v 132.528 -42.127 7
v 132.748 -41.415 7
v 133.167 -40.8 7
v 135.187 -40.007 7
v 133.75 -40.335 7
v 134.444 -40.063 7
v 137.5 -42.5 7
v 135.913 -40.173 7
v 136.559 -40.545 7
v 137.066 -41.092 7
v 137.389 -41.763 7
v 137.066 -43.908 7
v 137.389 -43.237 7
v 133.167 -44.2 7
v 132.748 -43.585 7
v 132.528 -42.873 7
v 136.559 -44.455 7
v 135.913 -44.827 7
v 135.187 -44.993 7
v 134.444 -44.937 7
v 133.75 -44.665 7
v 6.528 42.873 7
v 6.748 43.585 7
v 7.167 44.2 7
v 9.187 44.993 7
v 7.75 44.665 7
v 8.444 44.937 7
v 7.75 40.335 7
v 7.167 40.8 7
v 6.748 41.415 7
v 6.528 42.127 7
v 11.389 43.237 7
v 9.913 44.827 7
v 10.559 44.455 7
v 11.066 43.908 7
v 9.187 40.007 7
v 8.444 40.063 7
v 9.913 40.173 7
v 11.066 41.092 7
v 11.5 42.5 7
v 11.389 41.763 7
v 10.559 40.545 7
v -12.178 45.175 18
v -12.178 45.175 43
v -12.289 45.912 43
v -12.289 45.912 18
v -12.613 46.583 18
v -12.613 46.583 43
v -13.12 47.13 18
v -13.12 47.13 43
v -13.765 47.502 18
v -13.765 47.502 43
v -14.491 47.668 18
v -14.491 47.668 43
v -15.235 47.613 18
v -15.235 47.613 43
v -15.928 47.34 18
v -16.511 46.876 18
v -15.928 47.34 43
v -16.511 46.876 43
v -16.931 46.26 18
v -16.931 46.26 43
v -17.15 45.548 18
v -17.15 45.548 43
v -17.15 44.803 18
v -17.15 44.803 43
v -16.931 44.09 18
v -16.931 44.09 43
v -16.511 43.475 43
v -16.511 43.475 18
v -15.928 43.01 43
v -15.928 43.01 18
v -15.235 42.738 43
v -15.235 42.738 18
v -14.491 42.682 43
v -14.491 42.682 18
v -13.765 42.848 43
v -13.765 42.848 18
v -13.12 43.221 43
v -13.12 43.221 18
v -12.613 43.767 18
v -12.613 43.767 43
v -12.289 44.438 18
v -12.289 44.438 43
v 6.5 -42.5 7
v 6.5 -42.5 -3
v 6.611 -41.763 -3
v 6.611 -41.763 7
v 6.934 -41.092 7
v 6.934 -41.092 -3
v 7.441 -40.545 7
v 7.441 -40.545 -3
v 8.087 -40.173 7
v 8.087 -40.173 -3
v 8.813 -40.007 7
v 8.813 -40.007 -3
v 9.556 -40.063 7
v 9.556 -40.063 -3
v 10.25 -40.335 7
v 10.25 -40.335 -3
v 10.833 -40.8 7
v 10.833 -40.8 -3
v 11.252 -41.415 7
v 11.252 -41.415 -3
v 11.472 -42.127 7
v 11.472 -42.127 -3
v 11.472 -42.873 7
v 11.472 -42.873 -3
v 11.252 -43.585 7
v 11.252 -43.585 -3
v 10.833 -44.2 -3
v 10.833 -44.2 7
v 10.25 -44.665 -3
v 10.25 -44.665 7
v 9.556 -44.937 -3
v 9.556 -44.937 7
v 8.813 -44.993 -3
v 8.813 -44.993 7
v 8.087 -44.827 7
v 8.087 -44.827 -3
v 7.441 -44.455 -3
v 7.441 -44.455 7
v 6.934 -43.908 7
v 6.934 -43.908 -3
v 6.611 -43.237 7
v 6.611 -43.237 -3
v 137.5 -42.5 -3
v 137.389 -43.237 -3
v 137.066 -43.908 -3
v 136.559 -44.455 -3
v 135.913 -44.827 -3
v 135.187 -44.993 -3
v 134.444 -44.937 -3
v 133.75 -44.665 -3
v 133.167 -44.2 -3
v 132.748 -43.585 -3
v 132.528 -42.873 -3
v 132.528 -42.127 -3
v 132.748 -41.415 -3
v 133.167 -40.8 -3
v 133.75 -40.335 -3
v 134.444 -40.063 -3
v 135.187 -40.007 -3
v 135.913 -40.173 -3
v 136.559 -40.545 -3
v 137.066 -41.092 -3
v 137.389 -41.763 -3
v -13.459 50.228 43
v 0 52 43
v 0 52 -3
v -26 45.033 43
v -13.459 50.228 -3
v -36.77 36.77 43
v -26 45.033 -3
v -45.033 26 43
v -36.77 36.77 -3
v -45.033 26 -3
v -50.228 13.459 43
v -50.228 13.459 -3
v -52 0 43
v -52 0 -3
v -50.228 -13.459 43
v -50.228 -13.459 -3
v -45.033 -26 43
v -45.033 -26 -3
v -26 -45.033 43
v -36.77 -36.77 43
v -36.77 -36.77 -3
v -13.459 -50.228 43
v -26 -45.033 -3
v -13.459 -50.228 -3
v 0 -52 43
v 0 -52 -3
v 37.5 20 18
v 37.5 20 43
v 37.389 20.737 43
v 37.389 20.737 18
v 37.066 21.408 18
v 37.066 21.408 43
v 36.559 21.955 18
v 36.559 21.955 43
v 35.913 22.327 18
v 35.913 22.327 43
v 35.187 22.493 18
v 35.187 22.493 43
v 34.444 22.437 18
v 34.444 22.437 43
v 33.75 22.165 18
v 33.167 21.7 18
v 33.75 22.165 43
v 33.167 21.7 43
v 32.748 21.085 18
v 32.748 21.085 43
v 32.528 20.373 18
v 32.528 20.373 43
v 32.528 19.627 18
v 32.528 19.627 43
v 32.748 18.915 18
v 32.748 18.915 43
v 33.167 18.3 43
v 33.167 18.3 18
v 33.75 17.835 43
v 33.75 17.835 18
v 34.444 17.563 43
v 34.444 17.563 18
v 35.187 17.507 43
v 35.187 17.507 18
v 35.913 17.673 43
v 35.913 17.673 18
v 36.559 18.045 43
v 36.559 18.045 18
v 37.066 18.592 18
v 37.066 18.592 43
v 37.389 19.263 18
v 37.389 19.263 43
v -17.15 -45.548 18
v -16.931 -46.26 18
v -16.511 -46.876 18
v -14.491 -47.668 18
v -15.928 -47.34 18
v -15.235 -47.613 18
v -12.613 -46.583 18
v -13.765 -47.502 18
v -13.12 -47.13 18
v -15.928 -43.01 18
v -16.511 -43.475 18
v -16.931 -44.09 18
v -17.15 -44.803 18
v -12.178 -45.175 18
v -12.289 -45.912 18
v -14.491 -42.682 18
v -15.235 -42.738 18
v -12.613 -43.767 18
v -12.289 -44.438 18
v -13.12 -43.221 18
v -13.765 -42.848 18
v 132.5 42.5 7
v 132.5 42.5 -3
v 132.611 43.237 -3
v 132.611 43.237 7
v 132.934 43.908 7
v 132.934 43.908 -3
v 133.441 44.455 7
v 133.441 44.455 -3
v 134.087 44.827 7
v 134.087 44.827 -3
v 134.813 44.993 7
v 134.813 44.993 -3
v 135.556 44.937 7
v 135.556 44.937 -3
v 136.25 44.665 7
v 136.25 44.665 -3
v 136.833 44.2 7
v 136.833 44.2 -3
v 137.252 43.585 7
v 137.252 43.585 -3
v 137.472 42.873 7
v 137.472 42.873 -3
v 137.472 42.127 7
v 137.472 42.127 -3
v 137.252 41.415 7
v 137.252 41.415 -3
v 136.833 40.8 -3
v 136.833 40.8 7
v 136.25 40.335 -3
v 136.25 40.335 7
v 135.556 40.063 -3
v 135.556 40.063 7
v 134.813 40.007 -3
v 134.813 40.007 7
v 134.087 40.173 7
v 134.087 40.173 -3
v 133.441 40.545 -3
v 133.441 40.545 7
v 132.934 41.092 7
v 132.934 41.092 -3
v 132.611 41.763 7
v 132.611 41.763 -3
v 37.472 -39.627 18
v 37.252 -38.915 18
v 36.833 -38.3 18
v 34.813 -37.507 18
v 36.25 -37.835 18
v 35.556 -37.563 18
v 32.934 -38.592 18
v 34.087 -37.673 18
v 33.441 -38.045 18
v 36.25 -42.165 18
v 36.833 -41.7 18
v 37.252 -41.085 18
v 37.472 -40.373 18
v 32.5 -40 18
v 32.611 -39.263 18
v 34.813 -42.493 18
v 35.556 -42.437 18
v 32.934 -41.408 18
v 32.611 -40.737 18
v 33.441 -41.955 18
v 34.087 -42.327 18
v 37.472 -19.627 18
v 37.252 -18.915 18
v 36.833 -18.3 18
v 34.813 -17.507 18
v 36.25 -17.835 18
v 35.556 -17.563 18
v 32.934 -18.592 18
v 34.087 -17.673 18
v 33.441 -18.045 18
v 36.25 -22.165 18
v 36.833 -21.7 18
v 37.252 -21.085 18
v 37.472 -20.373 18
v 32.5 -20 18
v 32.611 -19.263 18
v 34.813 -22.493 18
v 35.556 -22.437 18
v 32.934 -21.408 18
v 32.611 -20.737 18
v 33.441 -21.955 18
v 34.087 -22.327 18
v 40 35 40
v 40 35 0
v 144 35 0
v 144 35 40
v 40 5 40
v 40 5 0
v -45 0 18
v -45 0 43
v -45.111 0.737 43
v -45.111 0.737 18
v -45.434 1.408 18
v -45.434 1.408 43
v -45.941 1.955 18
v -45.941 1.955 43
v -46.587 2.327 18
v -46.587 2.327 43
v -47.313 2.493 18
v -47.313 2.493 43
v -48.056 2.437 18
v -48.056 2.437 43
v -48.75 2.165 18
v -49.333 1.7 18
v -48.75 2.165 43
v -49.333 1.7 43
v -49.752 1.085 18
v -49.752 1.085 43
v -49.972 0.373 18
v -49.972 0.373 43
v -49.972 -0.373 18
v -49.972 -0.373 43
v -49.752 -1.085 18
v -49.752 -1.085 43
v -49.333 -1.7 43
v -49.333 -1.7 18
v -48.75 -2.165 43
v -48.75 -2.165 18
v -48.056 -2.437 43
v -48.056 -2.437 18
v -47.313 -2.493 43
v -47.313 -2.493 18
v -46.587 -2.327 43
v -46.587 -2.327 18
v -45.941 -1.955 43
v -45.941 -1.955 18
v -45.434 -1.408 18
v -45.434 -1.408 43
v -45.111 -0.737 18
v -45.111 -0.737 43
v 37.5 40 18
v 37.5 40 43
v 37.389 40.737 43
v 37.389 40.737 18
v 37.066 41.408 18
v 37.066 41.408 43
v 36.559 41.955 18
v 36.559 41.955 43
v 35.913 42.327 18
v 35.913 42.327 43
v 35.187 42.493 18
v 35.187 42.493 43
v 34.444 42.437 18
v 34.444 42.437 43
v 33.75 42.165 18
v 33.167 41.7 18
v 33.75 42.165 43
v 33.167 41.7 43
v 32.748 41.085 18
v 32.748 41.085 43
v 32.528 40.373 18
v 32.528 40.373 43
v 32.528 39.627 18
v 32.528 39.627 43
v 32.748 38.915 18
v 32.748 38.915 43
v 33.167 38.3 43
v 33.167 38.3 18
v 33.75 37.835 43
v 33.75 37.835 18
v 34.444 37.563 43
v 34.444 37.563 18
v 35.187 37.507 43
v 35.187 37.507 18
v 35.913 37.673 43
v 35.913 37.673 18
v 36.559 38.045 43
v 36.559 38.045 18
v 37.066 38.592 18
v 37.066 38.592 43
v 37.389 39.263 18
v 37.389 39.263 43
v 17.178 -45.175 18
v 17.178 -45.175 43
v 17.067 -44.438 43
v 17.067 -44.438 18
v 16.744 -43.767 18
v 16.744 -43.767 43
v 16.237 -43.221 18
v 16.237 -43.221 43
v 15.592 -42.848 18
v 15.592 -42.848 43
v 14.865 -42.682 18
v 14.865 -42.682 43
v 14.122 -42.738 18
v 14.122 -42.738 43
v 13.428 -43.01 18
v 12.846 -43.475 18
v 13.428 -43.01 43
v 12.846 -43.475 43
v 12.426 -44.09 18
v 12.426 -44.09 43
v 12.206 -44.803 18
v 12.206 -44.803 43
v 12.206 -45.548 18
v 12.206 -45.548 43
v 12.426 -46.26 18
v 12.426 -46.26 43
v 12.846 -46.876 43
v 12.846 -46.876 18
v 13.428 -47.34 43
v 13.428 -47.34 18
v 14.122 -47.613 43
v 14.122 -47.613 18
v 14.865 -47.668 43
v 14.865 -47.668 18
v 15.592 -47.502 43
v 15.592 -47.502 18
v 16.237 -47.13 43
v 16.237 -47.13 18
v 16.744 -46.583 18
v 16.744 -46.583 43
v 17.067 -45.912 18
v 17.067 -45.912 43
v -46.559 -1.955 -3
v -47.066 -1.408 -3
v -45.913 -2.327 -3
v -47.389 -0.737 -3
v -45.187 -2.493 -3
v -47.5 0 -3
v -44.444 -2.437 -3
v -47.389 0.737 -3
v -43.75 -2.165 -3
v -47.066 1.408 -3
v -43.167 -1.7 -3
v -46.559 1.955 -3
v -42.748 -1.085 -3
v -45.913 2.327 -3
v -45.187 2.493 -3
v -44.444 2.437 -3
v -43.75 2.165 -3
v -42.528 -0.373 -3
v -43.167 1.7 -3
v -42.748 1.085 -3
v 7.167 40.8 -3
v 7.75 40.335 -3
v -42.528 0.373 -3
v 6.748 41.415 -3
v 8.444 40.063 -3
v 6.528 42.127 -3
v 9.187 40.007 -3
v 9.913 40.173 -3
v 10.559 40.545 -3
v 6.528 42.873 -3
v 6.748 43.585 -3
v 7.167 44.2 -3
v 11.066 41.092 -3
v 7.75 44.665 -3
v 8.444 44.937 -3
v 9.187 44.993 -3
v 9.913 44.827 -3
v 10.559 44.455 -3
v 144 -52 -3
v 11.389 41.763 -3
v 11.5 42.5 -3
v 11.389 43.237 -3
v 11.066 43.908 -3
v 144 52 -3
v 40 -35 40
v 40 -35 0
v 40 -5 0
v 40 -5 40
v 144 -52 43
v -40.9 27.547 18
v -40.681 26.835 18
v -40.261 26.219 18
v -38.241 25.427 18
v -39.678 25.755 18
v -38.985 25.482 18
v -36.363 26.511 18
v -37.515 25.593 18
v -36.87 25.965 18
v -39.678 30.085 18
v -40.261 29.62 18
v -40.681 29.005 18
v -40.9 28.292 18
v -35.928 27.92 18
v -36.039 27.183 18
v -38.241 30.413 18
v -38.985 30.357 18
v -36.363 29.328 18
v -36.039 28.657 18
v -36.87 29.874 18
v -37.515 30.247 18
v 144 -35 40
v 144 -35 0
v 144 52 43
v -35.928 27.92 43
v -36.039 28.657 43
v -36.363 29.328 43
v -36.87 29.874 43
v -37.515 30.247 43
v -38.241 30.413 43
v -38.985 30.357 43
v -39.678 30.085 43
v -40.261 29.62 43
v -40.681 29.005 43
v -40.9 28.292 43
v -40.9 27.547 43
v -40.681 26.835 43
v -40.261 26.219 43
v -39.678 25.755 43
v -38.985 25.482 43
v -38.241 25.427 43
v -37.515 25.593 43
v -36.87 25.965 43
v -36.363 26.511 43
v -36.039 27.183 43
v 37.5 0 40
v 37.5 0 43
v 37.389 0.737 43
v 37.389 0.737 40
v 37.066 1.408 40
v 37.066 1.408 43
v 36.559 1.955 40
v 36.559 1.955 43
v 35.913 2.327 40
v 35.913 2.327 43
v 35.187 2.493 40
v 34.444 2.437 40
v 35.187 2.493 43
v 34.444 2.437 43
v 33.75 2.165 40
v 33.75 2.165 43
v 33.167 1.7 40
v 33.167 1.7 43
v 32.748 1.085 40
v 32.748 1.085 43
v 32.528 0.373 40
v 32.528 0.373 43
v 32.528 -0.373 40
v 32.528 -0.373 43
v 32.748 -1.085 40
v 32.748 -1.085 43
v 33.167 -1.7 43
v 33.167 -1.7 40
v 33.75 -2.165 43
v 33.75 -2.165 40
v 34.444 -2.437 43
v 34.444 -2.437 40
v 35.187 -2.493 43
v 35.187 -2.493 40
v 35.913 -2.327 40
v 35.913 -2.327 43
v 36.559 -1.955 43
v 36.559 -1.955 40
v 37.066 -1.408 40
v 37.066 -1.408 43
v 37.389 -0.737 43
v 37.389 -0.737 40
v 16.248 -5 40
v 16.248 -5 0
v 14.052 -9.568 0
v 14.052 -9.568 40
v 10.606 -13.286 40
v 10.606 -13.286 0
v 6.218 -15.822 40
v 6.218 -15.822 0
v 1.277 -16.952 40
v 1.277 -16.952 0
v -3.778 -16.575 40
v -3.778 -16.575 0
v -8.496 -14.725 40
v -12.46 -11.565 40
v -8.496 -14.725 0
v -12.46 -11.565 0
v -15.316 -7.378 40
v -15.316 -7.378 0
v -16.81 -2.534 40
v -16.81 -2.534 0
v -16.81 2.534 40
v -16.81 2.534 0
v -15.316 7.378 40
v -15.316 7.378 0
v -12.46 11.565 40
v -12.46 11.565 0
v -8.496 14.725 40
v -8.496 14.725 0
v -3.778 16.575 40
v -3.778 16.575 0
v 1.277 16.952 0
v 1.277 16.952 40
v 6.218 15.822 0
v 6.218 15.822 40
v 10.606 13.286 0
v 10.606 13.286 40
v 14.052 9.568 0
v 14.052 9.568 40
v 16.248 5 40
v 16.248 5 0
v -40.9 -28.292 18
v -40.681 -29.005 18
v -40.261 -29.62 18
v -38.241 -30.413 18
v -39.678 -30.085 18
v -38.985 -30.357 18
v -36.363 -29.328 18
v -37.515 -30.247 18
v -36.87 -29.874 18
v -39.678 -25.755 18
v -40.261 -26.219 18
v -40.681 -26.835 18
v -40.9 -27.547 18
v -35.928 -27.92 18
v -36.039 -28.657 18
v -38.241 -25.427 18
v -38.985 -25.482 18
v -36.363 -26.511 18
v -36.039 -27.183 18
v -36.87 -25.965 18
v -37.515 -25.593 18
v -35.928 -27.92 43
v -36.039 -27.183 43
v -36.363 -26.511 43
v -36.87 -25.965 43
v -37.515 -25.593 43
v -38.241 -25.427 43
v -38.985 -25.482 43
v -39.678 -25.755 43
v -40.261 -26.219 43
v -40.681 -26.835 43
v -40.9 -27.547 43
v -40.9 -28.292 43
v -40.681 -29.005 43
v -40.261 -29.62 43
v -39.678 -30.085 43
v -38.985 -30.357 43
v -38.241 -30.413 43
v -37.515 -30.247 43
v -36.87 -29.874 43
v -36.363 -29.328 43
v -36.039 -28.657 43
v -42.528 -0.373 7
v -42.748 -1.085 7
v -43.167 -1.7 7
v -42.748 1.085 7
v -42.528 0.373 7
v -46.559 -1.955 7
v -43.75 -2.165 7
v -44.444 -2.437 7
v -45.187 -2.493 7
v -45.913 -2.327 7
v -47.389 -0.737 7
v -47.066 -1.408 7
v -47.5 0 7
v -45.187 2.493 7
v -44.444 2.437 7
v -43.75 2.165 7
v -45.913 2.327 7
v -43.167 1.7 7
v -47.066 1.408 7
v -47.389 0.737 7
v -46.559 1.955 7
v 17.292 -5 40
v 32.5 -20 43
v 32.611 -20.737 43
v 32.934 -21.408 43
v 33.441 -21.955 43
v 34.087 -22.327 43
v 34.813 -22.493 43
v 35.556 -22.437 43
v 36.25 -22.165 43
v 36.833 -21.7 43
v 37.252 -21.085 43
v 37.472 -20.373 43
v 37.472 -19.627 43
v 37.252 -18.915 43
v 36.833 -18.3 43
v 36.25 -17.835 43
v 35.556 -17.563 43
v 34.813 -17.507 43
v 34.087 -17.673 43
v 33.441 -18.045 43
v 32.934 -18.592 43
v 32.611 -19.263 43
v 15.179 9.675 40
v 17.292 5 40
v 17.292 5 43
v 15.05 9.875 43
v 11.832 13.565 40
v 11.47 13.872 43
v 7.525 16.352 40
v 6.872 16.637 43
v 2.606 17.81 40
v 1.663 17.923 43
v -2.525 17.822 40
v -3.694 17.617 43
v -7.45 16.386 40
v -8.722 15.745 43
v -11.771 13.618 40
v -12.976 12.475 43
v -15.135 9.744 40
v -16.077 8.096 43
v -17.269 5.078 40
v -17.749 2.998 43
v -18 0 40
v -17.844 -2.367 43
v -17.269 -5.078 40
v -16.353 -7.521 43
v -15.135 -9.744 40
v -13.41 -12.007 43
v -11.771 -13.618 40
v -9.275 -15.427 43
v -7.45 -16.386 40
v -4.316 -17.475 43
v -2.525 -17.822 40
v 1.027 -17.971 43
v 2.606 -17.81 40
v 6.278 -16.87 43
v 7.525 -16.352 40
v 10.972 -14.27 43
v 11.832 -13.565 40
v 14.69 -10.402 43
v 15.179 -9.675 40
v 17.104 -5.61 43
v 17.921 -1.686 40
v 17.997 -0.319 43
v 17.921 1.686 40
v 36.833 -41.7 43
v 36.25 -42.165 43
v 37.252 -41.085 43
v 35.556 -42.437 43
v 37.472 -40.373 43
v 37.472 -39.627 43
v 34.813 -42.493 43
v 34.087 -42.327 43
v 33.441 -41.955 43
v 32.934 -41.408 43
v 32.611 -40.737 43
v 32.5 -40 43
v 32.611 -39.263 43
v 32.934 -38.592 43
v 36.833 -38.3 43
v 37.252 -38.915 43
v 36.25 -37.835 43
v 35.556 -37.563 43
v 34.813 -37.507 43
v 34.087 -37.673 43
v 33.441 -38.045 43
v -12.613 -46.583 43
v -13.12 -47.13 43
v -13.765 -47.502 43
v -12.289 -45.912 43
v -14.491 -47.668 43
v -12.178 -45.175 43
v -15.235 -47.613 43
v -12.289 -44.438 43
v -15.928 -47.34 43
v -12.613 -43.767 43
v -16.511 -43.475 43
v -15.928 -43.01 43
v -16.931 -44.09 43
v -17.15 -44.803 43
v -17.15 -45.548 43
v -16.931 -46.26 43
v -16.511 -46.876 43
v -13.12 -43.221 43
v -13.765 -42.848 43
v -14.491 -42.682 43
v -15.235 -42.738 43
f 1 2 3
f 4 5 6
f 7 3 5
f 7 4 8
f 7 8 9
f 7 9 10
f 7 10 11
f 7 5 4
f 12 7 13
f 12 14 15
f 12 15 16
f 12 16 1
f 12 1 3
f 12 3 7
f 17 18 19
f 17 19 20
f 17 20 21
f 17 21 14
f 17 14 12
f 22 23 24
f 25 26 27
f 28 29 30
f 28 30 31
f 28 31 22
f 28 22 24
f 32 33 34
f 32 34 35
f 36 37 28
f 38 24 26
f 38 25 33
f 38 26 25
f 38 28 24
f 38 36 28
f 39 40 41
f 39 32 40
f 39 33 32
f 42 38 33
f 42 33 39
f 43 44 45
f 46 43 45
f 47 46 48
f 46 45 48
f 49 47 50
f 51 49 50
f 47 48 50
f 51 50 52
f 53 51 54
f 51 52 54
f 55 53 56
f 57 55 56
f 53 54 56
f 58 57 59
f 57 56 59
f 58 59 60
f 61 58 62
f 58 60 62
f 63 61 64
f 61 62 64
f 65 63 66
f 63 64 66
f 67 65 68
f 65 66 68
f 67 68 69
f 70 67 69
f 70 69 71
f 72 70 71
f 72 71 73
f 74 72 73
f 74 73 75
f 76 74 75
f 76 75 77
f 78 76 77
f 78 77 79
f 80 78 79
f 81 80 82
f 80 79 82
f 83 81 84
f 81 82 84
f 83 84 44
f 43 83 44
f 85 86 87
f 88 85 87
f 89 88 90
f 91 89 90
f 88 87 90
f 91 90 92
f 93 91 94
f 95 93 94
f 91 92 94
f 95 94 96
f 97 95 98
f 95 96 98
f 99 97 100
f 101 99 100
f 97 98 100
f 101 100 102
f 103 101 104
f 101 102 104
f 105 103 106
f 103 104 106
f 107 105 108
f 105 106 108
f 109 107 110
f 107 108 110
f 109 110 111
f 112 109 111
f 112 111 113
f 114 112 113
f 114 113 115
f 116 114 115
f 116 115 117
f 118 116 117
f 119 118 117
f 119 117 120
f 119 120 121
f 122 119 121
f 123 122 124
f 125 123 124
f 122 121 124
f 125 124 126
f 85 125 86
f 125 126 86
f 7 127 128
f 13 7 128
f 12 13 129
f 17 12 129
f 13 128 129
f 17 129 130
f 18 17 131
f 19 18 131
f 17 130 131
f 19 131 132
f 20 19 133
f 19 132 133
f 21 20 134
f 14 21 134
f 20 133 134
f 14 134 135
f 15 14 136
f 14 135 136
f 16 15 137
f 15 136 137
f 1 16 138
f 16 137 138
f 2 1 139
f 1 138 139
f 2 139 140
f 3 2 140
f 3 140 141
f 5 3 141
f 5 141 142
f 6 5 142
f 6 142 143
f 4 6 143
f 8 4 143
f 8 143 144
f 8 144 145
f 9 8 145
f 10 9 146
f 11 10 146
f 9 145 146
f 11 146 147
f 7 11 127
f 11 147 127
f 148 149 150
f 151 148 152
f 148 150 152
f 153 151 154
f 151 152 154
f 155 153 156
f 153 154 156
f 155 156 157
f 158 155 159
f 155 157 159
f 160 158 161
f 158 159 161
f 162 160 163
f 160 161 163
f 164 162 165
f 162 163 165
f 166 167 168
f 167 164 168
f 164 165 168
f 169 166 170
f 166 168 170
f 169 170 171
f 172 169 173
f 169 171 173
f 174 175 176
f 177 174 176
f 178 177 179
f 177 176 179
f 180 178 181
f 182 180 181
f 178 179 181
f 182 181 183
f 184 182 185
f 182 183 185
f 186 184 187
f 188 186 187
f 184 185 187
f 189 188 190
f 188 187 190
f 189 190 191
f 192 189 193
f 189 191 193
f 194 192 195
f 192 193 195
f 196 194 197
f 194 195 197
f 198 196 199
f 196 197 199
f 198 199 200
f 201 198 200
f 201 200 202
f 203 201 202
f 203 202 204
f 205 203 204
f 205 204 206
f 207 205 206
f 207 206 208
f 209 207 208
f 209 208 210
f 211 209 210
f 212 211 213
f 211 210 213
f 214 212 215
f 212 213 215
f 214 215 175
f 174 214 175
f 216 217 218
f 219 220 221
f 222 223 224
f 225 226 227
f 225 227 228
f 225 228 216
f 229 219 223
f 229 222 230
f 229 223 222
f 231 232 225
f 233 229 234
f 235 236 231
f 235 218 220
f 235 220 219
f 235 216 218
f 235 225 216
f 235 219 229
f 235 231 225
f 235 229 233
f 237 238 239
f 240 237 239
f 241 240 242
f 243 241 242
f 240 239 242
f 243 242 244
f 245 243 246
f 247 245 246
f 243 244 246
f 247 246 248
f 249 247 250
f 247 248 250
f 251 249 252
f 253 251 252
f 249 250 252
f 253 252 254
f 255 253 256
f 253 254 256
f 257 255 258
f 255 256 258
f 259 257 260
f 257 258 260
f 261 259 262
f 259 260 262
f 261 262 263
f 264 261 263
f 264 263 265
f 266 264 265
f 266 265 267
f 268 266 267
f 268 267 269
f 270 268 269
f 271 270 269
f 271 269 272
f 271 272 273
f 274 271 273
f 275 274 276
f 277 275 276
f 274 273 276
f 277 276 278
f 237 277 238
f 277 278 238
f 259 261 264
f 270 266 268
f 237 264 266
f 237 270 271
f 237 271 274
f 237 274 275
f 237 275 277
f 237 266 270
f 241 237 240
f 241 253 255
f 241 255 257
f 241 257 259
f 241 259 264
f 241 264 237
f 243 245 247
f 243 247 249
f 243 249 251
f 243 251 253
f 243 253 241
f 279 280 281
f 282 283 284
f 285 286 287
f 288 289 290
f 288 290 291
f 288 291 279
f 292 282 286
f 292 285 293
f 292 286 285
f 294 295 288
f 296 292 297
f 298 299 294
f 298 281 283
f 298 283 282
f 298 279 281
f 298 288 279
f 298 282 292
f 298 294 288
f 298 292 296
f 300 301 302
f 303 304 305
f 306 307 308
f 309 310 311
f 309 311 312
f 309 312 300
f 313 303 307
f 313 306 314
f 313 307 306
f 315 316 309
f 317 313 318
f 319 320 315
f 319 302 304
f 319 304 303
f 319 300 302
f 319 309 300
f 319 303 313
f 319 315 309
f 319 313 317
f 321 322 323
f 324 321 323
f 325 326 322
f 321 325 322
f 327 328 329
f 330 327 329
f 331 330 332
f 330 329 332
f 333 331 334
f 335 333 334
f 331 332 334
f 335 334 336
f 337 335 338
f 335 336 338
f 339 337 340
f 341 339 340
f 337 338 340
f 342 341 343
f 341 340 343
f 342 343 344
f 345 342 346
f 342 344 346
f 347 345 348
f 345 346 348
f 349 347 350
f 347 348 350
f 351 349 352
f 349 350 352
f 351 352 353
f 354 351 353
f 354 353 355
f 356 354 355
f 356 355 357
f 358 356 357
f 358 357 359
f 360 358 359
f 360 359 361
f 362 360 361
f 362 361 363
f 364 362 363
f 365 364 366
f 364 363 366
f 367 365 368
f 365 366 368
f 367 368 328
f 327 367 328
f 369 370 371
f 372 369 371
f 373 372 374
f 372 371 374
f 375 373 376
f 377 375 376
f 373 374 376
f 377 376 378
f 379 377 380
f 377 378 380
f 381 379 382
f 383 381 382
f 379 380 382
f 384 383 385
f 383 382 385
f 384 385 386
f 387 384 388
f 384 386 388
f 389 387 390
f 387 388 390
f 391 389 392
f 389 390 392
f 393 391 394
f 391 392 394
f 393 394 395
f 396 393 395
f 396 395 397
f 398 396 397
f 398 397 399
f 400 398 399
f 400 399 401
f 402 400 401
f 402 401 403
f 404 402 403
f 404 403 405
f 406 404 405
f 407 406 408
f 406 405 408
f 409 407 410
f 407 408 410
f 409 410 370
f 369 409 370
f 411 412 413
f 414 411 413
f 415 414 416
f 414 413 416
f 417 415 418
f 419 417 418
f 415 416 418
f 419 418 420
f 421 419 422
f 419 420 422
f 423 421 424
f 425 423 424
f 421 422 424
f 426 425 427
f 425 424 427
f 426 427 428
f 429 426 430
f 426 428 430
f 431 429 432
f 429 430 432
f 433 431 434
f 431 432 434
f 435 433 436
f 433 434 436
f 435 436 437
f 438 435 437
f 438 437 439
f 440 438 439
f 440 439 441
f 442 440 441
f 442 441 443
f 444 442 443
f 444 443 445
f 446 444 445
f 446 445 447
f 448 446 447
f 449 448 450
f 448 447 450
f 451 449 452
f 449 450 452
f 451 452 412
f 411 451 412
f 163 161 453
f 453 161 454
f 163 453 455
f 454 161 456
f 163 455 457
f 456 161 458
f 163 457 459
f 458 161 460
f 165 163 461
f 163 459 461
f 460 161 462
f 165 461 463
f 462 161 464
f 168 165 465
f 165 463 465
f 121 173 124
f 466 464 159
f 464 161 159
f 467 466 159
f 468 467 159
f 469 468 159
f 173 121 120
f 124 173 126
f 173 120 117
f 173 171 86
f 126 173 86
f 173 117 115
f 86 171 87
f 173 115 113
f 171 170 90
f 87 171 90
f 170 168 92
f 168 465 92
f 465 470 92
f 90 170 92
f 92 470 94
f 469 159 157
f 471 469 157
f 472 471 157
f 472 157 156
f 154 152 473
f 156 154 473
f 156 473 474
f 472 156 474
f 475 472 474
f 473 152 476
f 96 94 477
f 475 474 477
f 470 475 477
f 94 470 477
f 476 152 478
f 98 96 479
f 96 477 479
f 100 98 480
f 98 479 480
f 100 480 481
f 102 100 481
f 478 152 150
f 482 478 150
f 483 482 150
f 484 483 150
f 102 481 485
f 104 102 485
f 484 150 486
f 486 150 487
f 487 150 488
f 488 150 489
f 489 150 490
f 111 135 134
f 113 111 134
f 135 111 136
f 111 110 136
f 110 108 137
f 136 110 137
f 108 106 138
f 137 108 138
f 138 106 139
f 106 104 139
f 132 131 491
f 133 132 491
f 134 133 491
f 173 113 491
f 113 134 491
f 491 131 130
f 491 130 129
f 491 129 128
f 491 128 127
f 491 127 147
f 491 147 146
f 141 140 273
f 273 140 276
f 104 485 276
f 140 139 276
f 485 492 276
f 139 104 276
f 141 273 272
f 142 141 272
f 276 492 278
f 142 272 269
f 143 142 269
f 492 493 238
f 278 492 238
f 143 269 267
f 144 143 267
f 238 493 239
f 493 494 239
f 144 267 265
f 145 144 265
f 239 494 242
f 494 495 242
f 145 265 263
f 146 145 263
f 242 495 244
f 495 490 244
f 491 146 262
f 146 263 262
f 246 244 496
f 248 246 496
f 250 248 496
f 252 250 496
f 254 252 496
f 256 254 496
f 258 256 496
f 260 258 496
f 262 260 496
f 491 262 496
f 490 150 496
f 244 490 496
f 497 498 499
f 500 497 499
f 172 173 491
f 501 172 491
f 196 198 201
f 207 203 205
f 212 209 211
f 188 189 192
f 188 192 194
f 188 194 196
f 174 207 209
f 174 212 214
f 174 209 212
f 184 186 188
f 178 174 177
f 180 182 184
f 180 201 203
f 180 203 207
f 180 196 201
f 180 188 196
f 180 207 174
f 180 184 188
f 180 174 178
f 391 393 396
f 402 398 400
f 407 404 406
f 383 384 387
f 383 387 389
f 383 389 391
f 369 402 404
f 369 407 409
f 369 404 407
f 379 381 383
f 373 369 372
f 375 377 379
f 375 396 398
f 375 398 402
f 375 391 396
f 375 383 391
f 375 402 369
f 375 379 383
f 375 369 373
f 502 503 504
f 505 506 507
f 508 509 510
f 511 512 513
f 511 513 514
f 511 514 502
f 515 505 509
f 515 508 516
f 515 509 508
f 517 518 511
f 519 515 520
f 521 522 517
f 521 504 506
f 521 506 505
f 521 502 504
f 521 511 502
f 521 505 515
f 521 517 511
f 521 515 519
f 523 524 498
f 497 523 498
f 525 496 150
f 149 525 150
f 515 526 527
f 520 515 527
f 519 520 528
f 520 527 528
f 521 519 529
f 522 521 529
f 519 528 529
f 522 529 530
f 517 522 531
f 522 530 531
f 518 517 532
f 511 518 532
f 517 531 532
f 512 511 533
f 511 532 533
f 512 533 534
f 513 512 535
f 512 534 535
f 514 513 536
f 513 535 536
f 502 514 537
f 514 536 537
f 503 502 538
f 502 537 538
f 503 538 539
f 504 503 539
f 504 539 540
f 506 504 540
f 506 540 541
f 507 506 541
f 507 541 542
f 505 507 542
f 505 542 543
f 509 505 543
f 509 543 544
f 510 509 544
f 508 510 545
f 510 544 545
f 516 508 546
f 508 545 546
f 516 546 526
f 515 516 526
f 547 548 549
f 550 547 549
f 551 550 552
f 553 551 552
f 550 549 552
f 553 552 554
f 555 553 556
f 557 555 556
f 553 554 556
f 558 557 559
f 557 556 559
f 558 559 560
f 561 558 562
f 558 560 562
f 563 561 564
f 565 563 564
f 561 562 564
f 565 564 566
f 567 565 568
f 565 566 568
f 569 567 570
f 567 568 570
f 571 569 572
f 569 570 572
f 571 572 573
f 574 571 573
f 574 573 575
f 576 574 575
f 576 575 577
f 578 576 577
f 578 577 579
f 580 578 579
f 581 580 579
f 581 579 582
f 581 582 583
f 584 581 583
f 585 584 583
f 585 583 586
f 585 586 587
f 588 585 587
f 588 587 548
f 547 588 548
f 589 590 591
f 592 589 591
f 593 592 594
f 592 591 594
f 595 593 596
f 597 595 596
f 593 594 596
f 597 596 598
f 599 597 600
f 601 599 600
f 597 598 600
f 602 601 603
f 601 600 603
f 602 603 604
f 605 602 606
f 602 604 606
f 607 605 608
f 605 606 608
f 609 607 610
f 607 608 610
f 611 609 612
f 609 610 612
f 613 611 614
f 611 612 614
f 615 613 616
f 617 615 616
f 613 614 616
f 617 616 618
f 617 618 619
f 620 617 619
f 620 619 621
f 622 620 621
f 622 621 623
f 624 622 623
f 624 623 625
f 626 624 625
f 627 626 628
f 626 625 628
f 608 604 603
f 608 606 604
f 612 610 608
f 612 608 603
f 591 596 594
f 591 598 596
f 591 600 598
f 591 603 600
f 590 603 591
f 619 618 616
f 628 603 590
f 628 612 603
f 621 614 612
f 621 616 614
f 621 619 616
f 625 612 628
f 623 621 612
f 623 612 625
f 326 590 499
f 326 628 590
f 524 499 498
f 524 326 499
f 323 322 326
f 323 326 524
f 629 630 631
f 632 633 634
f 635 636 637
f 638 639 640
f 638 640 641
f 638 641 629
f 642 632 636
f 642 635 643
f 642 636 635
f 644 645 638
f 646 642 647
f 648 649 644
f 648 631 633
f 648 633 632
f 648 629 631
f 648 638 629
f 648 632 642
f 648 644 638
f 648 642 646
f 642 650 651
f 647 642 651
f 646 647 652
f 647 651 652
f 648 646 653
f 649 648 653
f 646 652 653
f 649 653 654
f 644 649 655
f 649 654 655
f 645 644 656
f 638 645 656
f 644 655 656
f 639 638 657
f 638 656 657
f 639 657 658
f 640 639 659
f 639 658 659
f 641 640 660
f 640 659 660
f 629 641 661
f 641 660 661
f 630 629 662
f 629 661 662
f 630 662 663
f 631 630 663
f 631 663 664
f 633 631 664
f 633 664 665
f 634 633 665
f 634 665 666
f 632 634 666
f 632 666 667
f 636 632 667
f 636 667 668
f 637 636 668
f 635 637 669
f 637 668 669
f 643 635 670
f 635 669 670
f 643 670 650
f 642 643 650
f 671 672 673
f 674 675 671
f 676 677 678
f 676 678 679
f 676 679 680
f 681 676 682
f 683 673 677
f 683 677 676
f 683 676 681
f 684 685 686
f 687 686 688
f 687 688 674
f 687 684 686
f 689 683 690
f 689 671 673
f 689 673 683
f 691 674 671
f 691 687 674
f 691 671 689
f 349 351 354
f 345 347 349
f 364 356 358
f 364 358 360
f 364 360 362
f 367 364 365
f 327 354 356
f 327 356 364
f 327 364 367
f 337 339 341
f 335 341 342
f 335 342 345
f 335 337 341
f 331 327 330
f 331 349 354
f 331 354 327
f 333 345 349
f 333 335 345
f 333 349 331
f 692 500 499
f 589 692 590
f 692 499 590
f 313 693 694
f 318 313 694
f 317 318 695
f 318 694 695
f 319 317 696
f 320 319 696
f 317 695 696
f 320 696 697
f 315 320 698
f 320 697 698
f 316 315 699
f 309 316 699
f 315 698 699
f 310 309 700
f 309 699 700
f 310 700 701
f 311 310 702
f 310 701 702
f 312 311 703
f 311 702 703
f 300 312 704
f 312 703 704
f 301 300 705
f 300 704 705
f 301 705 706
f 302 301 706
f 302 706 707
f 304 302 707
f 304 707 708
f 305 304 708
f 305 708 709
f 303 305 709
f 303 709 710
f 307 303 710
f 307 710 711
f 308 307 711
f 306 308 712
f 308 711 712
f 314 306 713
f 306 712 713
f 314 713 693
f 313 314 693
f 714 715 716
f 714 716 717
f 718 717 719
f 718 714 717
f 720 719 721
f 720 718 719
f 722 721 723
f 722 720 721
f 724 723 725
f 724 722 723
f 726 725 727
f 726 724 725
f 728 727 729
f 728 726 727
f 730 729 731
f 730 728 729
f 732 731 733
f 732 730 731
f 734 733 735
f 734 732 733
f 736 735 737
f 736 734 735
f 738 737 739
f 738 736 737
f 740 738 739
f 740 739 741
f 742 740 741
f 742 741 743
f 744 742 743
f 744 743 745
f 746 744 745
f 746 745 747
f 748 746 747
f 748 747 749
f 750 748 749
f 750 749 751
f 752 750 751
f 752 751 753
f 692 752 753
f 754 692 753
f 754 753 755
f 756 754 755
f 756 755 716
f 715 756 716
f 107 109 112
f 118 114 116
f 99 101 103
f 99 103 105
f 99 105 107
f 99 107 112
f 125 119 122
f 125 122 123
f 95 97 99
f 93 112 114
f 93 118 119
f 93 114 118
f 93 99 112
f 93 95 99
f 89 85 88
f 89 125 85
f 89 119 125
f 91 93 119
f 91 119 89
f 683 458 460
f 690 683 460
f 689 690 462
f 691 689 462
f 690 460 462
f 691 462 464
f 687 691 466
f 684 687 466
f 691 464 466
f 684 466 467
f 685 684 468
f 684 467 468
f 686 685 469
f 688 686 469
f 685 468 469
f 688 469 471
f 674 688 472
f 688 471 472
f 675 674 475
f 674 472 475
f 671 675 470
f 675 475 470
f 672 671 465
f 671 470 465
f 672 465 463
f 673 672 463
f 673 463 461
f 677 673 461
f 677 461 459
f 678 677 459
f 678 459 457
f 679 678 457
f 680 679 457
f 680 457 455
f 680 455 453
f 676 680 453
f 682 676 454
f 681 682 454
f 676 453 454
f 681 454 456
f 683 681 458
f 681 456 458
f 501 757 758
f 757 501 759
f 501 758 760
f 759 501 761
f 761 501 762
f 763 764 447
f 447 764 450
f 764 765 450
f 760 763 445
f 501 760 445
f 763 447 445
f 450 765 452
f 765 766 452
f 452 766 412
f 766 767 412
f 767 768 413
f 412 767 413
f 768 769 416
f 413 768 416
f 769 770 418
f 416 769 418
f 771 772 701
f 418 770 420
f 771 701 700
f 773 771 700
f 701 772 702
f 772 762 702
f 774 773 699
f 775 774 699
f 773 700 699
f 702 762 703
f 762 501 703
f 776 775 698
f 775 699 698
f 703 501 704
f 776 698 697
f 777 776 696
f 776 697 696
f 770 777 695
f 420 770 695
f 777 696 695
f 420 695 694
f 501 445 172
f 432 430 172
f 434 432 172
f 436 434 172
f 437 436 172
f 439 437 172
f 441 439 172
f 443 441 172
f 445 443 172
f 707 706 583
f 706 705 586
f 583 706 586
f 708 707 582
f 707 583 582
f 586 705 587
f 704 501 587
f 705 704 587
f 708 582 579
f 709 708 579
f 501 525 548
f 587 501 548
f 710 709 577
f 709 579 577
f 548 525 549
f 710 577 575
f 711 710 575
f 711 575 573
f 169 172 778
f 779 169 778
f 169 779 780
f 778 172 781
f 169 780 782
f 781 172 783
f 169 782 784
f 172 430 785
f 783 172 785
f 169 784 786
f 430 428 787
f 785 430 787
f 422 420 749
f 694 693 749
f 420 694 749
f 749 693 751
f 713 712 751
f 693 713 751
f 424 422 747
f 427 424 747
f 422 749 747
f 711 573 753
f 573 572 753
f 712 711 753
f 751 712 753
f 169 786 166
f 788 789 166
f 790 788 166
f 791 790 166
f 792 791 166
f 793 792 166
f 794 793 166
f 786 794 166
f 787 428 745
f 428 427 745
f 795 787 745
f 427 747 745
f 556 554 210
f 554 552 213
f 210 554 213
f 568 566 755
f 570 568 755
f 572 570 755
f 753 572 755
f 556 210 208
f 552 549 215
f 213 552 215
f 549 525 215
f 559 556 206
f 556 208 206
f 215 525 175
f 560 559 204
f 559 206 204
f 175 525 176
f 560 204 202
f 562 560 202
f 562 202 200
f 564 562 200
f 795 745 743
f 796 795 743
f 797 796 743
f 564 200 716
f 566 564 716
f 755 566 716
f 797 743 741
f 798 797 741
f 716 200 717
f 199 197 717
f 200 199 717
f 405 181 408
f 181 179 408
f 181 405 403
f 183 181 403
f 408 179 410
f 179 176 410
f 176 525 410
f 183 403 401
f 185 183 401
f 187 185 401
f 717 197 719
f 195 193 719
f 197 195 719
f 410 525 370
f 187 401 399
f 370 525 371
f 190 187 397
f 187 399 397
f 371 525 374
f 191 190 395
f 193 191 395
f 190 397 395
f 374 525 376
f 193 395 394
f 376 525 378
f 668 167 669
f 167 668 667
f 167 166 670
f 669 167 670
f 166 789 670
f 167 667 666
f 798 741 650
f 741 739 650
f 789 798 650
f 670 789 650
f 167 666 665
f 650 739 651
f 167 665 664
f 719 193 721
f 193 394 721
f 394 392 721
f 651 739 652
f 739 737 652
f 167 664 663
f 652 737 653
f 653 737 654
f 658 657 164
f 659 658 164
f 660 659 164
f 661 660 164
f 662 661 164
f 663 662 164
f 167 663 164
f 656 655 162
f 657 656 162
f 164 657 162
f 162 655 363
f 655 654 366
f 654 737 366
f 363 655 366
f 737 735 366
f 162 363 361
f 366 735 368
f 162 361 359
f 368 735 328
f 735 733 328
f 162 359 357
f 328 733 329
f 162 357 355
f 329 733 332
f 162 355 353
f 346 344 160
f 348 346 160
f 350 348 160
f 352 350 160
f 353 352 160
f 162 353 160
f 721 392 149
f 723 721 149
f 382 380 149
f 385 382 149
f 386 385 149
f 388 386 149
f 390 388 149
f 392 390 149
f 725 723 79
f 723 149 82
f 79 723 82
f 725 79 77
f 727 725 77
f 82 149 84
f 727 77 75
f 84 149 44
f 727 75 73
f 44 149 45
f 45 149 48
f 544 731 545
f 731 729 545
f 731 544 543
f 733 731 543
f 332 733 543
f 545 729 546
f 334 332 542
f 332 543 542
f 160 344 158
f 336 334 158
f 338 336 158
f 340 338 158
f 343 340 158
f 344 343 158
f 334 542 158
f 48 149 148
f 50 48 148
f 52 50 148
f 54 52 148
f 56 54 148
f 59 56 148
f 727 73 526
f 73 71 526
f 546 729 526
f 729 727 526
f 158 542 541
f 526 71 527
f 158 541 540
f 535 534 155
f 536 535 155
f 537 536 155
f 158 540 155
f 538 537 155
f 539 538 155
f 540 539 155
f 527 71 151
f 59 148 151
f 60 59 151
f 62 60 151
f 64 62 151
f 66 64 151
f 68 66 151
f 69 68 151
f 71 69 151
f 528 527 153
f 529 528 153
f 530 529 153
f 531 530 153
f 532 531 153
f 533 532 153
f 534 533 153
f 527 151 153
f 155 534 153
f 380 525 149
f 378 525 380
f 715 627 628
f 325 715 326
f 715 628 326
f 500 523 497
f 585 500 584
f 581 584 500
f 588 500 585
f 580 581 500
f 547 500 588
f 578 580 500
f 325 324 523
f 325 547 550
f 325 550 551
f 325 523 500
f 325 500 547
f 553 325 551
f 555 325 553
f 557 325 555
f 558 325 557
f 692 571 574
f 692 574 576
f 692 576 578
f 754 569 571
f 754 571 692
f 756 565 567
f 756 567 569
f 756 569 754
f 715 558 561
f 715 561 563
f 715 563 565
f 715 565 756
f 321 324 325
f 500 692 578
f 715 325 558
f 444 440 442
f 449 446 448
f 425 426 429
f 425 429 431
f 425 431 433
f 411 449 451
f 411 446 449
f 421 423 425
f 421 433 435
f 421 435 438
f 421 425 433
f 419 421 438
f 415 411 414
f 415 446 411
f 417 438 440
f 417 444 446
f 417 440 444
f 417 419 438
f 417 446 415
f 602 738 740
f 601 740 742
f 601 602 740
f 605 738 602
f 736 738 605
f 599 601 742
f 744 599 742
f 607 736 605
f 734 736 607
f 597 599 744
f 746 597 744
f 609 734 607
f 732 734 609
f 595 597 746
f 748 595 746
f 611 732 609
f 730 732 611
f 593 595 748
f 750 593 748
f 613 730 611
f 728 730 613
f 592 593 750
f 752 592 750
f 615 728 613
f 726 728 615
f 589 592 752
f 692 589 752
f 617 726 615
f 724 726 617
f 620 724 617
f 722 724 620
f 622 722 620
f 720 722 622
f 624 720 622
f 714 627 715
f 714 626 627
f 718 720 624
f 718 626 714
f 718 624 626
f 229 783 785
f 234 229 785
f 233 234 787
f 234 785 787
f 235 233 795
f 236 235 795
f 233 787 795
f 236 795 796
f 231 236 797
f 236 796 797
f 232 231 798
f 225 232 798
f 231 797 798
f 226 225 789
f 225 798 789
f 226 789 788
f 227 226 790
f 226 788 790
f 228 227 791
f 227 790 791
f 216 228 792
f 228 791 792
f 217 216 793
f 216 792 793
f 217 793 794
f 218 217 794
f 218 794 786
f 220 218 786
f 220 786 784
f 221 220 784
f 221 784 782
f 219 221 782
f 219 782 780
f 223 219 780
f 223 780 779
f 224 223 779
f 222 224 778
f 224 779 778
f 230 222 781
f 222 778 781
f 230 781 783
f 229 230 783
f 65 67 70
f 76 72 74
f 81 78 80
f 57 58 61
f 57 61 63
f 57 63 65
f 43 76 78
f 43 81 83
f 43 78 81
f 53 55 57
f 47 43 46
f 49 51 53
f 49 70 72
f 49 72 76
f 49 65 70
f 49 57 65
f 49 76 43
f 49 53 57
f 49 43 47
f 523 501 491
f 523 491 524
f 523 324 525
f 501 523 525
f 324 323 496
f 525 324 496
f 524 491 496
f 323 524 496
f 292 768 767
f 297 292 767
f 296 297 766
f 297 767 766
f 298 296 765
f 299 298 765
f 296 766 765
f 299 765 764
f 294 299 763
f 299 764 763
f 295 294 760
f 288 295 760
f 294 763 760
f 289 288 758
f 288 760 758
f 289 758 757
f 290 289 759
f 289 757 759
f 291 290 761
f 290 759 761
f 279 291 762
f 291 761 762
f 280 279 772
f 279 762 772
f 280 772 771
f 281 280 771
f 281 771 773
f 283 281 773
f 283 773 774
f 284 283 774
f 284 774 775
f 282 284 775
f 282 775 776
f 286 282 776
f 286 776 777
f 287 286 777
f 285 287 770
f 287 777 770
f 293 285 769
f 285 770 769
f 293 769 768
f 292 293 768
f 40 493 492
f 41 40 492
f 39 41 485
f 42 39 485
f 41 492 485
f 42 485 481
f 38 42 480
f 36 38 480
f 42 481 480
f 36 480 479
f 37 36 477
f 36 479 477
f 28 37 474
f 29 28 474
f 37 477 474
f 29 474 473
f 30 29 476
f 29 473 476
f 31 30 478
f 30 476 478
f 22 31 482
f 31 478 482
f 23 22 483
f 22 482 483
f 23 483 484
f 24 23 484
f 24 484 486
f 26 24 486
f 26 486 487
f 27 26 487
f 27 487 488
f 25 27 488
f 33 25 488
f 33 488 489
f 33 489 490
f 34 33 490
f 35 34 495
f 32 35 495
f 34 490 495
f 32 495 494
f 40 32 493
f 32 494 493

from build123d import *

# Parameters (mm, degrees)
SALIENTE_EXTRUIR1_DEPTH = 40
CROQUIS4_R              = 18
SALIENTE_EXTRUIR2_DEPTH = 3
SALIENTE_EXTRUIR3_START = 3
SALIENTE_EXTRUIR3_DEPTH = 3
CROQUIS6_R              = 2.5
CORTAR_EXTRUIR1_DEPTH   = 10
CROQUIS7_R              = 2.5
CORTAR_EXTRUIR2_DEPTH   = 25


with BuildPart() as part:
    # Croquis2 → Saliente-Extruir1 (new body)
    with BuildSketch(Plane.XY):
        with BuildLine():
            Line((144, 52), (0, 52))
            ThreePointArc((0, 52), (-52, 0), (0, -52))
            Line((0, -52), (144, -52))
            Line((144, -52), (144, -35))
            Line((144, -35), (40, -35))
            Line((40, -35), (40, -5))
            Line((40, -5), (16.248076809, -5))
            ThreePointArc((16.248076809, -5), (-17, 0), (16.248076809, 5))
            Line((16.248076809, 5), (40, 5))
            Line((40, 5), (40, 35))
            Line((40, 35), (144, 35))
            Line((144, 35), (144, 52))
        make_face()
    extrude(amount=SALIENTE_EXTRUIR1_DEPTH)

    # Croquis4 → Saliente-Extruir2 (add)
    with BuildSketch(Plane.XY.offset(40)):
        with BuildLine():
            Line((144, 52), (144, -52))
            Line((144, -52), (0, -52))
            ThreePointArc((0, -52), (-52, 0), (0, 52))
            Line((0, 52), (144, 52))
        make_face()
        with Locations(Location((0, 0, 0), (0, 0, 16.127620213))):
            Circle(CROQUIS4_R, mode=Mode.SUBTRACT)
    extrude(amount=SALIENTE_EXTRUIR2_DEPTH)

    # Croquis5 → Saliente-Extruir3 (add)
    with BuildSketch(Plane(origin=(0, 0, 0), x_dir=(-1, 0, 0), z_dir=(0, 0, -1)).offset(SALIENTE_EXTRUIR3_START)):
        with BuildLine():
            Line((0, -52), (-144, -52))
            Line((-144, -52), (-144, 52))
            Line((-144, 52), (0, 52))
            ThreePointArc((0, 52), (52, 0), (0, -52))
        make_face()
    extrude(amount=-SALIENTE_EXTRUIR3_DEPTH)

    # Croquis6 → Cortar-Extruir1 (cut)
    with BuildSketch(Plane(origin=(0, 0, -3), x_dir=(-1, 0, 0), z_dir=(0, 0, -1))):
        with Locations((-135, 42.5)):
            Circle(CROQUIS6_R)
        with Locations(Location((-9, 42.5, 0), (0, 0, 180))):
            Circle(CROQUIS6_R)
        with Locations((-9, -42.5)):
            Circle(CROQUIS6_R)
        with Locations(Location((-135, -42.5, 0), (0, 0, 180))):
            Circle(CROQUIS6_R)
        with Locations((45, 0)):
            Circle(CROQUIS6_R)
    extrude(amount=-CORTAR_EXTRUIR1_DEPTH, mode=Mode.SUBTRACT)

    # Croquis7 → Cortar-Extruir2 (cut)
    with BuildSketch(Plane.XY.offset(43)):
        with Locations((35, 0)):
            Circle(CROQUIS7_R)
        with Locations((35, 20)):
            Circle(CROQUIS7_R)
        with Locations((35, 40)):
            Circle(CROQUIS7_R)
        with Locations(Location((35, -40, 0), (0, 0, 180))):
            Circle(CROQUIS7_R)
        with Locations(Location((35, -20, 0), (0, 0, 180))):
            Circle(CROQUIS7_R)
        with Locations((-14.678307233, 45.175184524)):
            Circle(CROQUIS7_R)
        with Locations((-38.428307233, 27.919799484)):
            Circle(CROQUIS7_R)
        with Locations((-47.5, 0)):
            Circle(CROQUIS7_R)
        with Locations((-38.428307233, -27.919799484)):
            Circle(CROQUIS7_R)
        with Locations((-14.678307233, -45.175184524)):
            Circle(CROQUIS7_R)
        with Locations((14.678307233, -45.175184524)):
            Circle(CROQUIS7_R)
    extrude(amount=-CORTAR_EXTRUIR2_DEPTH, mode=Mode.SUBTRACT)


solid = part.part
